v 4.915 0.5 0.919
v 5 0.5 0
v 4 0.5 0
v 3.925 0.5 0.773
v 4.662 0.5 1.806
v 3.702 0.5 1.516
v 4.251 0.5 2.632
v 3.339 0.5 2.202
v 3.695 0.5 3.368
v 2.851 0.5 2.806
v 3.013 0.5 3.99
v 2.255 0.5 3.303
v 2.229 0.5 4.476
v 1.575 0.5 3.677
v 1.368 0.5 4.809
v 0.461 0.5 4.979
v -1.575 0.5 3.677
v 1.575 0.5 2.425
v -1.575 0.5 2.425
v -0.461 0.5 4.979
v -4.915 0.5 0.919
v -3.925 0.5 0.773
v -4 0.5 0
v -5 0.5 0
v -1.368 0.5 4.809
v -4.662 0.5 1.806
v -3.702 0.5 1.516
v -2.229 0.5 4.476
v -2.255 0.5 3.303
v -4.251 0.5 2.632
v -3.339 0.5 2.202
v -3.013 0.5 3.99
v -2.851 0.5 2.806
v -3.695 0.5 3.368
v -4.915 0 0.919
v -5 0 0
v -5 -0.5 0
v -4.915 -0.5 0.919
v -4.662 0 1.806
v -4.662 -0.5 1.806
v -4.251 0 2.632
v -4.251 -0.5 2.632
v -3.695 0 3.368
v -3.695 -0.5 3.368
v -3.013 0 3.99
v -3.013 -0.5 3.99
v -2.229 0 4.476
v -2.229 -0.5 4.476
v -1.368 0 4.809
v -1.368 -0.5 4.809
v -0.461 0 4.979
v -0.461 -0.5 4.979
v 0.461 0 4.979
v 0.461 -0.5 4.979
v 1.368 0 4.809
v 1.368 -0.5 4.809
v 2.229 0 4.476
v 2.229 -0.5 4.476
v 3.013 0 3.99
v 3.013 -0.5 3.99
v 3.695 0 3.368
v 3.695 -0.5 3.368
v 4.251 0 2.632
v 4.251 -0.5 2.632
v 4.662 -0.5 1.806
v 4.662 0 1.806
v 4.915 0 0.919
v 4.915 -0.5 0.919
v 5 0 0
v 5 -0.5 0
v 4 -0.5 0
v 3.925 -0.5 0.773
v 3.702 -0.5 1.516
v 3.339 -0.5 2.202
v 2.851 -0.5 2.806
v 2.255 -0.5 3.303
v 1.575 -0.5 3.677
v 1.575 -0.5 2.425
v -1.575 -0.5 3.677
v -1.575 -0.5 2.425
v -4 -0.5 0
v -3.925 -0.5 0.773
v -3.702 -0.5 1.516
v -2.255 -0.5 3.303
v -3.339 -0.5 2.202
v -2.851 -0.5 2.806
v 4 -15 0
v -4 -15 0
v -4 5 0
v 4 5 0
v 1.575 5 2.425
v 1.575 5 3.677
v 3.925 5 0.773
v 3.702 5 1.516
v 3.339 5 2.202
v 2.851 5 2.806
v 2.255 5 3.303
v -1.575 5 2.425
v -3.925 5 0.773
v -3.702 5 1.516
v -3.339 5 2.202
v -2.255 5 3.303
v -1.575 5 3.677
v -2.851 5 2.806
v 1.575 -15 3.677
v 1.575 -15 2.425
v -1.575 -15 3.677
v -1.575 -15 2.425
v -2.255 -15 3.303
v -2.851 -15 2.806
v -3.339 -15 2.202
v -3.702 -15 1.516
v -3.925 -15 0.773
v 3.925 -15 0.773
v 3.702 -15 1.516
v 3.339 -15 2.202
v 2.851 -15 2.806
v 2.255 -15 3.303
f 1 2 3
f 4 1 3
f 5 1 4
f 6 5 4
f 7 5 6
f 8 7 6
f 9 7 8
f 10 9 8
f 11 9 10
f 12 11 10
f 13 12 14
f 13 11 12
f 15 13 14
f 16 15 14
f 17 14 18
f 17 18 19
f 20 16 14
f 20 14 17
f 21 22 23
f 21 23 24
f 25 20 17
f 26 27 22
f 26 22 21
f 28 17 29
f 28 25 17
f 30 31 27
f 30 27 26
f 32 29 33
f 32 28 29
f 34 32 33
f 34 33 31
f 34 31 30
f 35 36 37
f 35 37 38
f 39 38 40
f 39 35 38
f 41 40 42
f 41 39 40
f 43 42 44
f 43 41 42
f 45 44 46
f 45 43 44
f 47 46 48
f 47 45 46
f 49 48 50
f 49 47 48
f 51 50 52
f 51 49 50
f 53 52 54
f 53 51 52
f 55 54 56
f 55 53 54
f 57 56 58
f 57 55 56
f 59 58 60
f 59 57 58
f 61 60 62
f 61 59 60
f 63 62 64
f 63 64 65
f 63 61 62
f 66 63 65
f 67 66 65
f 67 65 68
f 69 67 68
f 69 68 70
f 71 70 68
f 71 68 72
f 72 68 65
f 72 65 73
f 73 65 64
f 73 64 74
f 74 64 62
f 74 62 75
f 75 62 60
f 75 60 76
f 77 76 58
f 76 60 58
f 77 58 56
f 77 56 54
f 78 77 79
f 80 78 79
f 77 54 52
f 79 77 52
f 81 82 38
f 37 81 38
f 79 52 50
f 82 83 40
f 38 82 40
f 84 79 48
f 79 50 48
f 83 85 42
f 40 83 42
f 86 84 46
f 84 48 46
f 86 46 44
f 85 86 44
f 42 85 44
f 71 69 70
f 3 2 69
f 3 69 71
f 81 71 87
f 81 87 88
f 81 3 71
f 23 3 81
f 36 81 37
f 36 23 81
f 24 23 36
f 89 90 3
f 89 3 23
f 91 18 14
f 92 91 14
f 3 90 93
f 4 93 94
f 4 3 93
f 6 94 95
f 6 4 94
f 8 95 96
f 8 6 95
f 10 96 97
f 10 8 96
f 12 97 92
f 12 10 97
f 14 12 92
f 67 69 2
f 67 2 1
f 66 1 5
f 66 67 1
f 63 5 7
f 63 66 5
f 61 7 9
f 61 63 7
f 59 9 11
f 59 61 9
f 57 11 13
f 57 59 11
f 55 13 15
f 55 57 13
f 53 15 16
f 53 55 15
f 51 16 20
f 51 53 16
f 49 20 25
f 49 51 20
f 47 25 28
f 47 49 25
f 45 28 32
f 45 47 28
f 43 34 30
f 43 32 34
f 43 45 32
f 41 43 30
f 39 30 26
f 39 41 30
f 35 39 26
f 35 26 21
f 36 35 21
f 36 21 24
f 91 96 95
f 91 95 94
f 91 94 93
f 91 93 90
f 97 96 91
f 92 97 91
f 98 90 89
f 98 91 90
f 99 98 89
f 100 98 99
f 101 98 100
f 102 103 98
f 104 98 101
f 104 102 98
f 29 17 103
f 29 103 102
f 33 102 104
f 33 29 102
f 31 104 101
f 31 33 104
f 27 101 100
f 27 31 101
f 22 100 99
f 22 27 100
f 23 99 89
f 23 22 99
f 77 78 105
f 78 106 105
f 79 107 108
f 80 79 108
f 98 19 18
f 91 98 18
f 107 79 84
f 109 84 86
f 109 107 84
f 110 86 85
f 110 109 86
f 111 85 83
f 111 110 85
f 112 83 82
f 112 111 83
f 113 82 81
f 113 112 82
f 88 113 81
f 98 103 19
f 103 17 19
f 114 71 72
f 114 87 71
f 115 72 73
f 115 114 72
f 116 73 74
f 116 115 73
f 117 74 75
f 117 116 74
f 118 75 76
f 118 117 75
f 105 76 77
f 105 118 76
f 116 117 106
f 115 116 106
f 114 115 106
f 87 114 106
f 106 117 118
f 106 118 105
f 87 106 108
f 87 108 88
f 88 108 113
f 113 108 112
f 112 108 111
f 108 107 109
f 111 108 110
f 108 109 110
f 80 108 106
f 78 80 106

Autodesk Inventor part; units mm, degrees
ref_plane "YZ Plane" through (0, 0, 0) normal (1, 0, 0) x (0, 1, 0)
ref_plane "XZ Plane" through (0, 0, 0) normal (0, 1, 0) x (-1, 0, 0)
ref_plane "XY Plane" through (0, 0, 0) normal (0, 0, 1) x (1, 0, 0)
sketch "Sketch1" plane through (0, 0, 0) normal (0, 1, 0) x (-1, 0, 0)
  circle A0 centre (0, 0) radius 4
  line L0 (-1.575, 5.575) -> (1.575, 5.575)
  line L1 (1.575, 5.575) -> (1.575, 2.425)
  line L2 (1.575, 2.425) -> (-1.575, 2.425)
  line L3 (-1.575, 2.425) -> (-1.575, 5.575)
  line L4 (-1.575, 5.575) -> (1.575, 2.425) construction
  line L5 (1.575, 5.575) -> (-1.575, 2.425) construction
  line L6 (-1.575, -2.425) -> (1.575, -2.425)
  line L7 (1.575, -2.425) -> (1.575, -5.575)
  line L8 (1.575, -5.575) -> (-1.575, -5.575)
  line L9 (-1.575, -5.575) -> (-1.575, -2.425)
  line L10 (-1.575, -2.425) -> (1.575, -5.575) construction
  line L11 (1.575, -2.425) -> (-1.575, -5.575) construction
  point P0 (0, 0)
  point P1 (0, 4)
  point P2 (0, -4)
  point P3 (-1.575, 3.6769)
  point P4 (-1.575, -3.6769)
  point P5 (1.575, -3.6769)
  point P6 (1.575, 3.6769)
  dimension "d0" = 8
  dimension "d10" = 3.15
  dimension "d11" = 3.15
  dimension "d12" = 3.15
  dimension "d13" = 3.15
extrude "Extrusion1" add sketch "Sketch1" along normal blind 5 and the other way blind 15 contours A0 L7 L6 L9 L3 L2 L1
sketch "Sketch2" plane through (0, 0, 0) normal (0, 1, 0) x (-1, 0, 0)
  circle A0 centre (0, 0) radius 5
  dimension "d3" = 10
extrude "Extrusion2" add sketch "Sketch2" along normal mid plane 1
sketch "Sketch3" plane through (0, 5, 0) normal (0, 1, 0) x (0, 0, 1)
  line L0 (0, -14) -> (-10, -14)
  line L1 (-10, -14) -> (-10, 12)
  line L2 (-10, 12) -> (0, 12)
  line L3 (0, 12) -> (0, -14)
  point P0 (0, 0)
extrude "Extrusion3" cut sketch "Sketch3" against normal blind 22
properties part number "halfAxel"
